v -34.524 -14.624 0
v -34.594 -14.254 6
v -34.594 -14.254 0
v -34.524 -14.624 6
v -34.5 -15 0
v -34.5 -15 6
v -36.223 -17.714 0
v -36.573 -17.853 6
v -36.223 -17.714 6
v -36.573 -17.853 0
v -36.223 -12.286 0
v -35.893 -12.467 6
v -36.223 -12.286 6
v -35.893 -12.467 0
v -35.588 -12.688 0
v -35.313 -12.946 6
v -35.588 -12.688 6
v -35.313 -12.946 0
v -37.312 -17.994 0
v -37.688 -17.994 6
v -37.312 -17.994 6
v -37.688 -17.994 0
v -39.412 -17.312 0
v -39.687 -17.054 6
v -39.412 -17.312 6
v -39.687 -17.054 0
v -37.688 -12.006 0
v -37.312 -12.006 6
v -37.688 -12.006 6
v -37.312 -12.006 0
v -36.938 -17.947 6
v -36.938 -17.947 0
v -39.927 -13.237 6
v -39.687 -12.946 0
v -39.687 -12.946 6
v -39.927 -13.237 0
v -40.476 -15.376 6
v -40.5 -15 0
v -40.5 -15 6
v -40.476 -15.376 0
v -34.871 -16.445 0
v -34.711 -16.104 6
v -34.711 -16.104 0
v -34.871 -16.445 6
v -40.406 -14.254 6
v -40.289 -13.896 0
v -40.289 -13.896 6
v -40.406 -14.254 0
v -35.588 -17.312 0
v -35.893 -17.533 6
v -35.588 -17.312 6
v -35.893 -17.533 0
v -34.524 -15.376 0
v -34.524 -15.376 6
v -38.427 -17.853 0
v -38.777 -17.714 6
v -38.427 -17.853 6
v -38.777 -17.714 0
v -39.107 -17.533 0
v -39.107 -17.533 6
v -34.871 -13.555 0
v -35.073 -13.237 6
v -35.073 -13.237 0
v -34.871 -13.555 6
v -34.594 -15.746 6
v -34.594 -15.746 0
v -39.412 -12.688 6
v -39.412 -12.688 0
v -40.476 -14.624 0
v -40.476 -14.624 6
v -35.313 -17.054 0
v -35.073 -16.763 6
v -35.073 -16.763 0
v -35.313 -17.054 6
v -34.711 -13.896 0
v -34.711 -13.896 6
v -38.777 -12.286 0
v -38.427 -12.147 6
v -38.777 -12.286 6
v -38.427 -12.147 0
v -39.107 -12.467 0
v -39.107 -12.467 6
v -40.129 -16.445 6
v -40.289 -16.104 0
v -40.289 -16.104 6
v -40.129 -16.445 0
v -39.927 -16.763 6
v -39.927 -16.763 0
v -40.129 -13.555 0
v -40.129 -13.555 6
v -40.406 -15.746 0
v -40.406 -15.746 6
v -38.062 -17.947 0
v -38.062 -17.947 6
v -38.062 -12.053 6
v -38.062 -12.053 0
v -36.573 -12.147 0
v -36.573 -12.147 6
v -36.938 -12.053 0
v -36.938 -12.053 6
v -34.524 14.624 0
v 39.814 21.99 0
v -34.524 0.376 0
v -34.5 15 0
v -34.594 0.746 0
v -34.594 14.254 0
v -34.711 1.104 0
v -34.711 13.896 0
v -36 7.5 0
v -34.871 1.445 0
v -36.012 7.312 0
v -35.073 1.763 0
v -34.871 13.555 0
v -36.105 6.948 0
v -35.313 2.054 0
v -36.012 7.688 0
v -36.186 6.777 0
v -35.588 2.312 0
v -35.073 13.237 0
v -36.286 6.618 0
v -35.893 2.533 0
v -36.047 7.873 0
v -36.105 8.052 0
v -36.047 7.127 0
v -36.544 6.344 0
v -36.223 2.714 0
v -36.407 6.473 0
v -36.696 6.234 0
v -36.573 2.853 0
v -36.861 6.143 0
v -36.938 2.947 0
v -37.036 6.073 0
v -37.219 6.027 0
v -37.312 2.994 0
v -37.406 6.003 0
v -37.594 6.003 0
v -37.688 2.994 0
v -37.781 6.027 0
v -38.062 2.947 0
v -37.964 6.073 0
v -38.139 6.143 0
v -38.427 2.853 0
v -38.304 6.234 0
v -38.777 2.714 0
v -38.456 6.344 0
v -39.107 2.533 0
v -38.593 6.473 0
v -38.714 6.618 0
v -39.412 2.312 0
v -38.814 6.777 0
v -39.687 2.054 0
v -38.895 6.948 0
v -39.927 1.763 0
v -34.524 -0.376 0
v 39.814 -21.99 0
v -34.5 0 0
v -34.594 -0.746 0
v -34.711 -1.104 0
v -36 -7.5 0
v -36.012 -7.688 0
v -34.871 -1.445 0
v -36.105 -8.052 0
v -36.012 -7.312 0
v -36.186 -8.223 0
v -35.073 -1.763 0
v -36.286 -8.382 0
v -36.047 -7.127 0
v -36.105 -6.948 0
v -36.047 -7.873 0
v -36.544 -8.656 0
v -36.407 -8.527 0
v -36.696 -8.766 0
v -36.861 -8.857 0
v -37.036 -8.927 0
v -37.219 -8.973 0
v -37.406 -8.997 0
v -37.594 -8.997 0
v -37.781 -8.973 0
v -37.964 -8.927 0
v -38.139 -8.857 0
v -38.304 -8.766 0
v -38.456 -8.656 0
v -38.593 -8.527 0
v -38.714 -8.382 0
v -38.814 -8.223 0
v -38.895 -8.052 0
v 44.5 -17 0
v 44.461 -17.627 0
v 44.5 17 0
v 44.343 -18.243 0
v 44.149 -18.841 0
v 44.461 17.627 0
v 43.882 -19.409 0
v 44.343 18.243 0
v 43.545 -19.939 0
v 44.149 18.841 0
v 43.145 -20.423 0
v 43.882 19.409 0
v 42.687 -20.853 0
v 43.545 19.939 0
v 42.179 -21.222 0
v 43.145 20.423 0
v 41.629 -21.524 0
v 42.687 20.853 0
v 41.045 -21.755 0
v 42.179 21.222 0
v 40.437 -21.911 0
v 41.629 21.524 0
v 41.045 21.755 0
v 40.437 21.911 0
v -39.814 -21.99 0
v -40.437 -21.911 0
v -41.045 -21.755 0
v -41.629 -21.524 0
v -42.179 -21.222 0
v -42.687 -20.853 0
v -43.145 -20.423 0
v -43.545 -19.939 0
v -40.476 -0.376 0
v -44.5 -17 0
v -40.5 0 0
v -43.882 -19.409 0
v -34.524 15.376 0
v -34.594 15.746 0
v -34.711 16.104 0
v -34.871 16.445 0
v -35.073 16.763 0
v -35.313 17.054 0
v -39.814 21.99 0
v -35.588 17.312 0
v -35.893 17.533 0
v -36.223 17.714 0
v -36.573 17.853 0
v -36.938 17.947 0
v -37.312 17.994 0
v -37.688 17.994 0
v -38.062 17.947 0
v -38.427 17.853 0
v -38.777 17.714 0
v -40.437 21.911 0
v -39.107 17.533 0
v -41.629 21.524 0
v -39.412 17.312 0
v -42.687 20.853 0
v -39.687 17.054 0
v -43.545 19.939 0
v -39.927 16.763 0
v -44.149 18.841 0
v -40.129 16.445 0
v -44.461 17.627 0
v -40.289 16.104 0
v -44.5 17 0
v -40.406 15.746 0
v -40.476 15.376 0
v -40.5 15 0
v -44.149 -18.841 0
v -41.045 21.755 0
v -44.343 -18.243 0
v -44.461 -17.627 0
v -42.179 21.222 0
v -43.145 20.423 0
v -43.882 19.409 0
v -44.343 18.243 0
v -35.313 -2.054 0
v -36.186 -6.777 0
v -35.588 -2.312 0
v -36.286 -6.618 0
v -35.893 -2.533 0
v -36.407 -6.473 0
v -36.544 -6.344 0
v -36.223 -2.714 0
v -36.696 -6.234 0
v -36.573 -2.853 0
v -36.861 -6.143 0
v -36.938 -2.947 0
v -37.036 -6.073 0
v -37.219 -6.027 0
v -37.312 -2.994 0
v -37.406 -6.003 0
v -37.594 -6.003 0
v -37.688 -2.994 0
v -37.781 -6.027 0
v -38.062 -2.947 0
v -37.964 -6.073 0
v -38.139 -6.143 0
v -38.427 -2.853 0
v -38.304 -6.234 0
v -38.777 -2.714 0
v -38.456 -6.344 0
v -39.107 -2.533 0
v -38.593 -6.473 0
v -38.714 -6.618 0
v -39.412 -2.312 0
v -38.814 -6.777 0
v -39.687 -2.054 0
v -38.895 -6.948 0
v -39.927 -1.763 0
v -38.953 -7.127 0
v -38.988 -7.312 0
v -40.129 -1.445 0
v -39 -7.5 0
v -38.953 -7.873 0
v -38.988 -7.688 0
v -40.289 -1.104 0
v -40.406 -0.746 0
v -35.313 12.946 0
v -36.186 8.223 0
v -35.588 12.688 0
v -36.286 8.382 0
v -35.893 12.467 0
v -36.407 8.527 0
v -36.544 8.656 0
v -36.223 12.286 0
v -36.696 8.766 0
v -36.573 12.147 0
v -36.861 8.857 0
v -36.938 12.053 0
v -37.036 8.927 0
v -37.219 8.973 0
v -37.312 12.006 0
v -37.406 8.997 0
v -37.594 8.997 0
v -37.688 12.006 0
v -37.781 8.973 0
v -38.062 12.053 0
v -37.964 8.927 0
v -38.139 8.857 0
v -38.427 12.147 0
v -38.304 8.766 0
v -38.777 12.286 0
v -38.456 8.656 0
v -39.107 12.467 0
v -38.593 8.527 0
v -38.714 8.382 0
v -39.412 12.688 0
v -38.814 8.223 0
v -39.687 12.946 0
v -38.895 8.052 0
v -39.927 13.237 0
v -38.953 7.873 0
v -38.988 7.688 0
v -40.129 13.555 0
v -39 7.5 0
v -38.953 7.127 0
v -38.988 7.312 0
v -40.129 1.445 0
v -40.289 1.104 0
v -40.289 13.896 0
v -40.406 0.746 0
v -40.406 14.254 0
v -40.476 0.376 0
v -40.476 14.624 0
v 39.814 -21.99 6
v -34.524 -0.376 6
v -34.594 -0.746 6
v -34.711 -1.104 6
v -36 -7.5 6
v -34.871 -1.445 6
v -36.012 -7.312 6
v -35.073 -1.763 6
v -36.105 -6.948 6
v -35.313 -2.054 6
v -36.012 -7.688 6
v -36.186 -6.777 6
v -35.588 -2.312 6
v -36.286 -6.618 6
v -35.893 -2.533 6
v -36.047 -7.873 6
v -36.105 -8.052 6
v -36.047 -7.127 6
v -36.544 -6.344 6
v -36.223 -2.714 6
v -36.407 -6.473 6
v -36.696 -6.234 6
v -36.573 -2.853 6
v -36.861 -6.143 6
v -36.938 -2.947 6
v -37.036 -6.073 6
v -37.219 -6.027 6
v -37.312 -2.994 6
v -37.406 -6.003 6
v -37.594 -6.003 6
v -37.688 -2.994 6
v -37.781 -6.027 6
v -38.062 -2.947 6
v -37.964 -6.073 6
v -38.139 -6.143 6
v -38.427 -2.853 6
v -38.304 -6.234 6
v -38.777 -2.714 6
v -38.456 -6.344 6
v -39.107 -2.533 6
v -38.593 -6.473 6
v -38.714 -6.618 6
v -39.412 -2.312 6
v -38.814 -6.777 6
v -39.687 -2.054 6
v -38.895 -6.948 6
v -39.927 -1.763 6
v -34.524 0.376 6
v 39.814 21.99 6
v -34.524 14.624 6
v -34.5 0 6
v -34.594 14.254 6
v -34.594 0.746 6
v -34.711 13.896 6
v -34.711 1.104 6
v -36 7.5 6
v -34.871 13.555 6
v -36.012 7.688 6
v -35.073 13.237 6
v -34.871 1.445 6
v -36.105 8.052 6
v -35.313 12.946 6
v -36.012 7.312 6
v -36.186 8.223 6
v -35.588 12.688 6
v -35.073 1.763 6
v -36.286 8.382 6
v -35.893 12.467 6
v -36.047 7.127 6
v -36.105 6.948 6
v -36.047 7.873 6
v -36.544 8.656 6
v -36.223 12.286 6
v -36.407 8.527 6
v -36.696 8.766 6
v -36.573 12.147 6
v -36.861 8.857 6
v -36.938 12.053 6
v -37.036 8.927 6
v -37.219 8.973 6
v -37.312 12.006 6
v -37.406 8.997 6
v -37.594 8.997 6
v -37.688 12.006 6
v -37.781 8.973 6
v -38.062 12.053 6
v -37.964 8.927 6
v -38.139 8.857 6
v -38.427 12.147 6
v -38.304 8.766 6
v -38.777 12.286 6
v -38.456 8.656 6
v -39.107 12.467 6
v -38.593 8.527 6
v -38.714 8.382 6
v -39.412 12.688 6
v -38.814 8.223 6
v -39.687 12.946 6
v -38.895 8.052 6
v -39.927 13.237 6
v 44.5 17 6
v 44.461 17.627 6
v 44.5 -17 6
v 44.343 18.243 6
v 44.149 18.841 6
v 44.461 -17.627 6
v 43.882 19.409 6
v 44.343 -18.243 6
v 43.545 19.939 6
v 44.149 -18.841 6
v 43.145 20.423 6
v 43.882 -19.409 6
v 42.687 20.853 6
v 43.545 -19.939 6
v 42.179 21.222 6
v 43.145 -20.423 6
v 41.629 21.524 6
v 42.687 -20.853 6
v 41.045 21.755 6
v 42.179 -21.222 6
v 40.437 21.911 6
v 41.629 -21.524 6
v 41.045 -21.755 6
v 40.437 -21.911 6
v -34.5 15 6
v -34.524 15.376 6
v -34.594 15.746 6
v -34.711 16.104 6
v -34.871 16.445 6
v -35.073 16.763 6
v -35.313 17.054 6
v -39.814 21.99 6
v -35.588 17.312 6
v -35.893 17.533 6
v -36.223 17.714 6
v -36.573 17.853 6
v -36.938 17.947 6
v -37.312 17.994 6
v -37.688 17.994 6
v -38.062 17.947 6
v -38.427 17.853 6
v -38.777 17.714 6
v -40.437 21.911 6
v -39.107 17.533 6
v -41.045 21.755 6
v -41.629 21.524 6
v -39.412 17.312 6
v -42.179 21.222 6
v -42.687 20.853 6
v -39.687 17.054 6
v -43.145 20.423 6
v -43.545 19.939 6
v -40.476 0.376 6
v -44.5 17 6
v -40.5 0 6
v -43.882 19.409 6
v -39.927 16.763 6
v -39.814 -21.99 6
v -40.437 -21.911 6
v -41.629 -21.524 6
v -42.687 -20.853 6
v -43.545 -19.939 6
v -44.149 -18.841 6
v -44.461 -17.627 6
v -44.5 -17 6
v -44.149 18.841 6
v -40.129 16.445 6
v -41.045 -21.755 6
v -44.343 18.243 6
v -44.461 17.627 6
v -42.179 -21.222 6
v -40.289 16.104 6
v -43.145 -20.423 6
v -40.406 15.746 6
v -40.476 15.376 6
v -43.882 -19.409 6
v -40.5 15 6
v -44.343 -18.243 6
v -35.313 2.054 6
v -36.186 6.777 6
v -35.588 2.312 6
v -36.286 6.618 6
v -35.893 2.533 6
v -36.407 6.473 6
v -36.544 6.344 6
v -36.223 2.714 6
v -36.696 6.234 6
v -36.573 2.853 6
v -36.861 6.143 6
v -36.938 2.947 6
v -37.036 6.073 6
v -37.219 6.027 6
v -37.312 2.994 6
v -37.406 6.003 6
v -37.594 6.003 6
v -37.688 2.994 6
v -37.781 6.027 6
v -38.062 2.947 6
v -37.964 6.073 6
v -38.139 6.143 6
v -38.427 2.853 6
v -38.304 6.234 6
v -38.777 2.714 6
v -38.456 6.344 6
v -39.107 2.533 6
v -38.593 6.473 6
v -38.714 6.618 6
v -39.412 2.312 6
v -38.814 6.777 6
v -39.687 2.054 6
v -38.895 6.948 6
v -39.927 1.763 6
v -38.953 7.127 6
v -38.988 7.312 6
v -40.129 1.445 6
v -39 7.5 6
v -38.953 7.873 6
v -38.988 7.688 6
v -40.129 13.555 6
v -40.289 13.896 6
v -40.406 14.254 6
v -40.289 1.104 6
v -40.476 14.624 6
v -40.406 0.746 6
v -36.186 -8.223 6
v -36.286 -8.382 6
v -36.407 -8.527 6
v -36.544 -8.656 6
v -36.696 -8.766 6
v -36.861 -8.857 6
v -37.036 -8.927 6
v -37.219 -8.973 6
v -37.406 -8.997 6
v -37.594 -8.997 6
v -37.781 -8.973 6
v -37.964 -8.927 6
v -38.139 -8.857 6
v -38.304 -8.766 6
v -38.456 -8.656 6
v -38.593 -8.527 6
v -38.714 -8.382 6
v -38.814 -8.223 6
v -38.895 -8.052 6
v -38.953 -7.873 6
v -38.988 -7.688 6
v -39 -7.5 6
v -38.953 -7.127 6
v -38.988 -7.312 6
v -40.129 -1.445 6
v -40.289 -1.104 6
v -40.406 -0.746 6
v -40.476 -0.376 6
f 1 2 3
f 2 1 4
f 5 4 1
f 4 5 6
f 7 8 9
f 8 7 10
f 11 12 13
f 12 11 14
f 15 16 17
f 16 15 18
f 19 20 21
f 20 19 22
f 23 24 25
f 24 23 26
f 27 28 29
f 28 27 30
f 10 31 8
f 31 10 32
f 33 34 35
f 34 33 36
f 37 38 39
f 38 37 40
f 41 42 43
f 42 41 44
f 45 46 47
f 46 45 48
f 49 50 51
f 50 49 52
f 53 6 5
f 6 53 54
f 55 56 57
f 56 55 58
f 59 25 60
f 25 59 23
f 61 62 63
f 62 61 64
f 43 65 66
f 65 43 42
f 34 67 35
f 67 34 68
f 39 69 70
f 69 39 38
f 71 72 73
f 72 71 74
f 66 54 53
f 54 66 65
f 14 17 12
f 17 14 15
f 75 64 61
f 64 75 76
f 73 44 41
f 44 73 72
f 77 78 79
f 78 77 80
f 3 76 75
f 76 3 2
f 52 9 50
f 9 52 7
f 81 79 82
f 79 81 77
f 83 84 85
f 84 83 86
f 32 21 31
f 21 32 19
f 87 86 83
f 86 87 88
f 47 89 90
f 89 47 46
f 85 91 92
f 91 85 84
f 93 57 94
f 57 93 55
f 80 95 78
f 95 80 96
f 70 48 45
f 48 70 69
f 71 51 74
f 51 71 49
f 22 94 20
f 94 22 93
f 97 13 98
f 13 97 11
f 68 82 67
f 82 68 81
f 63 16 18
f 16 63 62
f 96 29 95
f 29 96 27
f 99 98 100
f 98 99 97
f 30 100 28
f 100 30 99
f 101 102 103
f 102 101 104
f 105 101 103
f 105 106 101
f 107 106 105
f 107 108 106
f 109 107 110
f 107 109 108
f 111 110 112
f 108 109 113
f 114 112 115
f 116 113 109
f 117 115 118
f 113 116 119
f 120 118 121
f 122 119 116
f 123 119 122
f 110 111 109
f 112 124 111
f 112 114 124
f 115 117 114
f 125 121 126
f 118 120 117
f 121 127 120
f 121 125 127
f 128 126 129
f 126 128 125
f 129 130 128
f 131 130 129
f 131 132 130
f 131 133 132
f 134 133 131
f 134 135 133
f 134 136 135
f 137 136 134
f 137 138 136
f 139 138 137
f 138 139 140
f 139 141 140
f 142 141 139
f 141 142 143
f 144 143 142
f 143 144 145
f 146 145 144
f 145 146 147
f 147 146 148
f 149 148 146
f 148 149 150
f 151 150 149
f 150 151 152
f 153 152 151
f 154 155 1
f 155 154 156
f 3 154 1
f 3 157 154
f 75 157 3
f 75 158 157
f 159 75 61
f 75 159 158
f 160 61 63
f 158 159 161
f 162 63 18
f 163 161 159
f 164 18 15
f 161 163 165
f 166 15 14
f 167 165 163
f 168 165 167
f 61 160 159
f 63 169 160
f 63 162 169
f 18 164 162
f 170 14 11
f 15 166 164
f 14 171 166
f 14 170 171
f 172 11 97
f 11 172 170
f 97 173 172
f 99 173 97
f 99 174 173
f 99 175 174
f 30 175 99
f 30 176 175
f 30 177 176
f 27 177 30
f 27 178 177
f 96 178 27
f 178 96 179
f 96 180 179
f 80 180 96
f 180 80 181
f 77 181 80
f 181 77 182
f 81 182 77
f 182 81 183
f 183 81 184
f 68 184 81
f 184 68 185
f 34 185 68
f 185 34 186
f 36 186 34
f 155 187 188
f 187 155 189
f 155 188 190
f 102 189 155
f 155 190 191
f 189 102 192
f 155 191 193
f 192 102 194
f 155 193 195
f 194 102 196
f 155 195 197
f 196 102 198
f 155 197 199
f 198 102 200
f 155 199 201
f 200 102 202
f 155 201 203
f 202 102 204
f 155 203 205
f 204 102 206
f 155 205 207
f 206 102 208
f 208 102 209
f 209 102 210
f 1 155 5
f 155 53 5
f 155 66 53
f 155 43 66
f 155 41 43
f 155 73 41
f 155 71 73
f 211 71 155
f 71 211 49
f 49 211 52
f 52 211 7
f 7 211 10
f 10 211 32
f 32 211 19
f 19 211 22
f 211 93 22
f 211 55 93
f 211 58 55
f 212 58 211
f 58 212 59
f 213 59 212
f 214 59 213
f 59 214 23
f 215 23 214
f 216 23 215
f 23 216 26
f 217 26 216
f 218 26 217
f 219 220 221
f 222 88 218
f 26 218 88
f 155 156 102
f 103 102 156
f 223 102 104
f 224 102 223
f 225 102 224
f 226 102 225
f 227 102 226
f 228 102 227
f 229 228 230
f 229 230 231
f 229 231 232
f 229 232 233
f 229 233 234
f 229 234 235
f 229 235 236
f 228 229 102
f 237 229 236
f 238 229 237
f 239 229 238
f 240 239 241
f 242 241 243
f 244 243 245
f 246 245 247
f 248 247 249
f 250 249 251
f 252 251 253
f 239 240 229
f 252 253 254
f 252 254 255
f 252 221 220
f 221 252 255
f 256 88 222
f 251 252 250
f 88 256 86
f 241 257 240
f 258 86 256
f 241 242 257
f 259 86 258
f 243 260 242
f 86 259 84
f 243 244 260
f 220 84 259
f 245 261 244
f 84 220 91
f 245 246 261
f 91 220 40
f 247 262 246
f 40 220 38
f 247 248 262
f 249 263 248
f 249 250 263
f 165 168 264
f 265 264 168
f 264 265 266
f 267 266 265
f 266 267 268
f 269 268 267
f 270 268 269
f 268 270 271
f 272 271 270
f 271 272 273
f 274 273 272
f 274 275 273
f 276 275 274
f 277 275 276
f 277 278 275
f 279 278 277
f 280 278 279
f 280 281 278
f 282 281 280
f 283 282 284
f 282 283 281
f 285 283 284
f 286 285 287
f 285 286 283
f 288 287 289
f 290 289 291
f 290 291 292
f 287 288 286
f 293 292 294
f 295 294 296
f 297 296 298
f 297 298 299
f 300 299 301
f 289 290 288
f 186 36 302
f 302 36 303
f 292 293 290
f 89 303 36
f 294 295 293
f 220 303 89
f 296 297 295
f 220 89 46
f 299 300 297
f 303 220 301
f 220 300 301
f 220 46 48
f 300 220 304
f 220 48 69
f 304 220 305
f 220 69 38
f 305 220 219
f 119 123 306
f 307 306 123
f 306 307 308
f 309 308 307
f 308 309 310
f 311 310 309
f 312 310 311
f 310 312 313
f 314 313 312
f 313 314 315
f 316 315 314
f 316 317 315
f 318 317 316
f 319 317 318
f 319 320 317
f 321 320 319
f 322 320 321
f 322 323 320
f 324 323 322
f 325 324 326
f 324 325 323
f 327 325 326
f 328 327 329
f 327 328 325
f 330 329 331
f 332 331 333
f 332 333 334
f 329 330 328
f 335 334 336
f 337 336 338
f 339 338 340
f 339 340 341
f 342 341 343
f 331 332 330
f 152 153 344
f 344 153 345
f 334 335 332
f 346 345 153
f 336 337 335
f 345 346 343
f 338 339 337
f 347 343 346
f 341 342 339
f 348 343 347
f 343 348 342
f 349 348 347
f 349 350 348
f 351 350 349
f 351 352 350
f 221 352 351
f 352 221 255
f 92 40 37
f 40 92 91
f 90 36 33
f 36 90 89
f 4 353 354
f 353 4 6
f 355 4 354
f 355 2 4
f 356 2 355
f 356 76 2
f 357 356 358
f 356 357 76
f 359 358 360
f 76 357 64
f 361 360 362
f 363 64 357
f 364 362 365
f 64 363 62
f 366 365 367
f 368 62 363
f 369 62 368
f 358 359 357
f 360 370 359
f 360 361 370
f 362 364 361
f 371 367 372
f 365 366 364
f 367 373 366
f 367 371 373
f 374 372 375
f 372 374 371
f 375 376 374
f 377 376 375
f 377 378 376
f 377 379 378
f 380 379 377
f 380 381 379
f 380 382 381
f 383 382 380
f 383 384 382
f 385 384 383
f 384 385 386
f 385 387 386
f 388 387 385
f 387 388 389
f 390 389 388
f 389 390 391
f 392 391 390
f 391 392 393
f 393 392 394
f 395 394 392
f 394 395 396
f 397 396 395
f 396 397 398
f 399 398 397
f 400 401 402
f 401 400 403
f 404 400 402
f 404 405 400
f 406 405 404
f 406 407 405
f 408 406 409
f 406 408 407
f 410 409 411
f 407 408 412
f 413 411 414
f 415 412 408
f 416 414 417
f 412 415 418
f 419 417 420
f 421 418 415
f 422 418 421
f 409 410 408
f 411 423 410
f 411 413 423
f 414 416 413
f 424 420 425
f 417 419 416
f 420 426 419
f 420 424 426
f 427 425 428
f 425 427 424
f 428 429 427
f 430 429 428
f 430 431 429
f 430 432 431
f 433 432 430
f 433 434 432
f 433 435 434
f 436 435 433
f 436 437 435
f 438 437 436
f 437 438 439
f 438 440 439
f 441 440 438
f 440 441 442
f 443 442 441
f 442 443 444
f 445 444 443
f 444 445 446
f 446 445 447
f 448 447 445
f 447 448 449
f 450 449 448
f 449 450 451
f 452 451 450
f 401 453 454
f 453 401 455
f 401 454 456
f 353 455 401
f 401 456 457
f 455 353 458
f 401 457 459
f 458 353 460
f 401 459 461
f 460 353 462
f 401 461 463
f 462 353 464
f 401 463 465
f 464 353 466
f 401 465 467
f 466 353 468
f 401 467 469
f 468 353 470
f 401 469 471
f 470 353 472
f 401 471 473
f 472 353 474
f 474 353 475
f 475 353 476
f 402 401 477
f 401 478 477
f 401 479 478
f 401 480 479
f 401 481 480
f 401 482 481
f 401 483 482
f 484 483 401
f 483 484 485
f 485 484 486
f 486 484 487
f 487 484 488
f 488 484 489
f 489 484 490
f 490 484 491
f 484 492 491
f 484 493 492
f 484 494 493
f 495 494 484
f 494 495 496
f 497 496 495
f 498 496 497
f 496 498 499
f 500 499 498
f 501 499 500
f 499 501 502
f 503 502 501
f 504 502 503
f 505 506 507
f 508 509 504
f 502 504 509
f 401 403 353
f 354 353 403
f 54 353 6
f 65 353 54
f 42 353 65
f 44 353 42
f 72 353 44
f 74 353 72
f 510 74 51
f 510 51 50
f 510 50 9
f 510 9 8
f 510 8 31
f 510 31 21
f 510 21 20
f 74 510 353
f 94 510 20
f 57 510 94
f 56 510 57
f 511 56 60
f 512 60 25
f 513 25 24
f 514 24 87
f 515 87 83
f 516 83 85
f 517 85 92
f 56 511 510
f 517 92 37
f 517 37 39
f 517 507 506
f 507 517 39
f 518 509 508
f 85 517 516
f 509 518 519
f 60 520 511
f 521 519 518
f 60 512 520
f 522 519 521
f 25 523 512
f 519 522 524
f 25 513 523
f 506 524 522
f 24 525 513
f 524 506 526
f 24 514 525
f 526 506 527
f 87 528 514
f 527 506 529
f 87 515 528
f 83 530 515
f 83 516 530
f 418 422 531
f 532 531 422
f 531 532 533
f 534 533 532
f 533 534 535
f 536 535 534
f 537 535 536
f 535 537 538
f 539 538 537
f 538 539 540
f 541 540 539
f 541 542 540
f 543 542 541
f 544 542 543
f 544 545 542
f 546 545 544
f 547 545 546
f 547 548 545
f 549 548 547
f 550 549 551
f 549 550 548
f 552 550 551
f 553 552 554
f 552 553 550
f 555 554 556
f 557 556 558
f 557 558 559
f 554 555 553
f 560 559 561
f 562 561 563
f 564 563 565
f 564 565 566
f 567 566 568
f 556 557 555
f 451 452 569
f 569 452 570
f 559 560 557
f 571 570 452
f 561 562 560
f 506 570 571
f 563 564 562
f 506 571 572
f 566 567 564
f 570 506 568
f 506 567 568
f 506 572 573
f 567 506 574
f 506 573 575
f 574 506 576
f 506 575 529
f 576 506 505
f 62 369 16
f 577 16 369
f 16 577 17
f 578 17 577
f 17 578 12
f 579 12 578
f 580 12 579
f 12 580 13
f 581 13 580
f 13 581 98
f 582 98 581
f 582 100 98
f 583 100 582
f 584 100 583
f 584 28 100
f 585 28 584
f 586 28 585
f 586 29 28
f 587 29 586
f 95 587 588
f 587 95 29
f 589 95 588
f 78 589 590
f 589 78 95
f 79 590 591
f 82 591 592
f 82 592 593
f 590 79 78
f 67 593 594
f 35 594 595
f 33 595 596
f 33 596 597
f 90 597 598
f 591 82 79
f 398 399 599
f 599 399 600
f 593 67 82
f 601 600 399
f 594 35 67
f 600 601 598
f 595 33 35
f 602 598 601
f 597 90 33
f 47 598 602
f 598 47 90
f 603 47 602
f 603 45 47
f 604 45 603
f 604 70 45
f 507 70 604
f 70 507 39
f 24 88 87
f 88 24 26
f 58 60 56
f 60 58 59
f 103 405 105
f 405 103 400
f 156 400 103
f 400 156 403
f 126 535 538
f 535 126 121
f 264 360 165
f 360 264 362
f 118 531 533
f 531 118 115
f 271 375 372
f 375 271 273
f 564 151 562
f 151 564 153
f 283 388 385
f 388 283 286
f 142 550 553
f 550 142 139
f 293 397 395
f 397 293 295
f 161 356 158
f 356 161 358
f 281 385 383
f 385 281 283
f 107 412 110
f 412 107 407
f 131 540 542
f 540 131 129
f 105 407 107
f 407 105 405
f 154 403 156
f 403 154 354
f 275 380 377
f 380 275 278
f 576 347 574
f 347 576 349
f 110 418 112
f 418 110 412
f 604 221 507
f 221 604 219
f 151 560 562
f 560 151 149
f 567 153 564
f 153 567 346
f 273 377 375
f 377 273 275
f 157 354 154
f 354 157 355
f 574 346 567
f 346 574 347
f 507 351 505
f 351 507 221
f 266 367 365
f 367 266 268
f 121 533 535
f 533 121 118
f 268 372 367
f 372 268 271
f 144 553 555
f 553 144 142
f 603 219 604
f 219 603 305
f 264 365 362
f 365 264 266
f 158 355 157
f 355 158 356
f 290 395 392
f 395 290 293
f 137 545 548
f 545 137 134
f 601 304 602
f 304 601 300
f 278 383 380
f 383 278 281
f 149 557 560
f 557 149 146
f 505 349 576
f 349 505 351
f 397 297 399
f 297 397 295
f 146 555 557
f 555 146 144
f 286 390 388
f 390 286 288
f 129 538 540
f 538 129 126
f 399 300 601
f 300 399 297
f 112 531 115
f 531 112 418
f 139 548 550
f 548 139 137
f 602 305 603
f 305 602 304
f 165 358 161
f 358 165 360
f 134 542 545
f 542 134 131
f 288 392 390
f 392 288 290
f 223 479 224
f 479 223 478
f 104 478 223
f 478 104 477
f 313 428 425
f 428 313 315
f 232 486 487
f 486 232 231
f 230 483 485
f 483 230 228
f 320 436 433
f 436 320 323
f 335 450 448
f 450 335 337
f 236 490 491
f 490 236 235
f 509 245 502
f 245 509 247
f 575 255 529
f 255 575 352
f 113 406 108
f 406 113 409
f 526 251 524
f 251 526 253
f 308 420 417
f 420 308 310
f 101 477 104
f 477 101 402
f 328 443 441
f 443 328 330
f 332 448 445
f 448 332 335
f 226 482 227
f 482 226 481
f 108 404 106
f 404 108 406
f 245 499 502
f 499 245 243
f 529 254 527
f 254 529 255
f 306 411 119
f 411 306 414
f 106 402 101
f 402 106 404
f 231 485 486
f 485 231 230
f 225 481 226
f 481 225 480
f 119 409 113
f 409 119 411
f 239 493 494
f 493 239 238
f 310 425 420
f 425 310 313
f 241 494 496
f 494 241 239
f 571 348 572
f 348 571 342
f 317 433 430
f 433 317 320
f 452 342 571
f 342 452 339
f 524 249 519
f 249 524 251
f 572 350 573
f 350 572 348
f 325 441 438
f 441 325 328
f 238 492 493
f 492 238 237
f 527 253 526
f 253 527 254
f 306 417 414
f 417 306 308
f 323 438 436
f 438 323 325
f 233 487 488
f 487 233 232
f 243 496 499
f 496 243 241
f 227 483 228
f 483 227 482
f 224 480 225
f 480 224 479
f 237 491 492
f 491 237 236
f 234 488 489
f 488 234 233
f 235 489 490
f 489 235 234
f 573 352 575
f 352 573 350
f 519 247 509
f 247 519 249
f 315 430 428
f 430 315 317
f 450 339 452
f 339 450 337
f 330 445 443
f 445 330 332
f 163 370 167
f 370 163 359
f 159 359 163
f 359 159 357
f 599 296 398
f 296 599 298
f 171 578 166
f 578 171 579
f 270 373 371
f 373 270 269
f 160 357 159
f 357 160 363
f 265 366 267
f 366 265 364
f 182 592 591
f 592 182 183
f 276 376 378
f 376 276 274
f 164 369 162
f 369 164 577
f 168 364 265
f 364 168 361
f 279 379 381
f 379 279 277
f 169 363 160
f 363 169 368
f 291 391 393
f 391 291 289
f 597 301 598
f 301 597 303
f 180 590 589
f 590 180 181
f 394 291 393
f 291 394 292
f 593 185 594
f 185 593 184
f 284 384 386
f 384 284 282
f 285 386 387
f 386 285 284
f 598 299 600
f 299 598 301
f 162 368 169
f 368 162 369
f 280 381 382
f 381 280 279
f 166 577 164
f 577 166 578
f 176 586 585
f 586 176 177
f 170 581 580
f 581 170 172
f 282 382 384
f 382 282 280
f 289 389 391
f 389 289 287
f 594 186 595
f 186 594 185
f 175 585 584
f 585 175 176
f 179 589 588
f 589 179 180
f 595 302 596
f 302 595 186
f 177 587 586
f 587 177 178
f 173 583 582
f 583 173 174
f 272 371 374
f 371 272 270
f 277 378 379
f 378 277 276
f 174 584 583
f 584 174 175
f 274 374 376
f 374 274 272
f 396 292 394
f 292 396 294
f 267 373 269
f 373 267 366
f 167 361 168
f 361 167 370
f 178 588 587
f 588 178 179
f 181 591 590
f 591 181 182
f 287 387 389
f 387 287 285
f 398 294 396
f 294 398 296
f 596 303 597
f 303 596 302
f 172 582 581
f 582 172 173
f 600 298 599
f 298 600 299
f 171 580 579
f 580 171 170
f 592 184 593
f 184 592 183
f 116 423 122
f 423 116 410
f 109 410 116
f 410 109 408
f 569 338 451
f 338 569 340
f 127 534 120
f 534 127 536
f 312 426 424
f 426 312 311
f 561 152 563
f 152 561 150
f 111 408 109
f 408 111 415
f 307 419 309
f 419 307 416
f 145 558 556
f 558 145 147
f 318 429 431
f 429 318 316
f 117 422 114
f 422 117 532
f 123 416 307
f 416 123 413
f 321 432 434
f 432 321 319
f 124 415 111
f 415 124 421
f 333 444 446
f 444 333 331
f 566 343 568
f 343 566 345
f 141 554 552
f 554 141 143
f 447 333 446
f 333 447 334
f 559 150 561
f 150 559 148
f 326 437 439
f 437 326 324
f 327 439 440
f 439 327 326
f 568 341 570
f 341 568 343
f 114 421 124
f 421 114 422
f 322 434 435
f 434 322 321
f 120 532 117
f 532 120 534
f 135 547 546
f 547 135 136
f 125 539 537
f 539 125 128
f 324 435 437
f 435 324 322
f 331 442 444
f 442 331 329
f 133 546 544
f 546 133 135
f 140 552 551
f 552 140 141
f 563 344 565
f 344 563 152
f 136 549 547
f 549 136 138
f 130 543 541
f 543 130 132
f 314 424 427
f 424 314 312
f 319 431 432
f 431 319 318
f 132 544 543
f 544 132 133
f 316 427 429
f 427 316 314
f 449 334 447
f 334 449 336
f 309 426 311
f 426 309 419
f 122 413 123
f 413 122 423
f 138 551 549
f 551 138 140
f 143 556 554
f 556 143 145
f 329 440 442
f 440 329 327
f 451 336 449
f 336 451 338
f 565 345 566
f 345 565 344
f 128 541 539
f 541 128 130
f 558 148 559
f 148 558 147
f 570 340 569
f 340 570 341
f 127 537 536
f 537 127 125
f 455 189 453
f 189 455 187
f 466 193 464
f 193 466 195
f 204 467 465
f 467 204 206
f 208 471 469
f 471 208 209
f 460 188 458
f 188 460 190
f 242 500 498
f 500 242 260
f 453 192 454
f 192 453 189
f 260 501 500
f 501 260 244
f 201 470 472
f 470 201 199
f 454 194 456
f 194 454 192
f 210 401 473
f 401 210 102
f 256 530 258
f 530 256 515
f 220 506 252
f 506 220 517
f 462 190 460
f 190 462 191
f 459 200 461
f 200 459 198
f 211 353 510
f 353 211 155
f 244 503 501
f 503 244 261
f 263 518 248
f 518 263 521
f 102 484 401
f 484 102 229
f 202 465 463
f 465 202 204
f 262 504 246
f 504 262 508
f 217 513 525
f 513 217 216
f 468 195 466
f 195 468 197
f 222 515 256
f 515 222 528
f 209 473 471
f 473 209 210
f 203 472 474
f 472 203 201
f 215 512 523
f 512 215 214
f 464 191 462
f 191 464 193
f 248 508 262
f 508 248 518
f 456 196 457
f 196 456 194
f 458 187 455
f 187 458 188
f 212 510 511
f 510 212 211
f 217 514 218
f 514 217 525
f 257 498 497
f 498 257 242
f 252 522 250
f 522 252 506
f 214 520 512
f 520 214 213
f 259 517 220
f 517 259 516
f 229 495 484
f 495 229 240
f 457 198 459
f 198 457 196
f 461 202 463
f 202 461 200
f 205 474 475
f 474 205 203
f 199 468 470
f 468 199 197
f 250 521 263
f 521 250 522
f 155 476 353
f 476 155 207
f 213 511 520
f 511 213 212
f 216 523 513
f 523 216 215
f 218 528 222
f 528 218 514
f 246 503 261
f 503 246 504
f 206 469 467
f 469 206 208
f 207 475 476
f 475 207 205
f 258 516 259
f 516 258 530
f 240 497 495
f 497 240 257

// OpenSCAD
$fn = 50;


difference() {
	union() {
		hull() {
			translate(v = [-39.5000000000, 17.0000000000, 0]) {
				cylinder(h = 6, r = 5);
			}
			translate(v = [39.5000000000, 17.0000000000, 0]) {
				cylinder(h = 6, r = 5);
			}
			translate(v = [-39.5000000000, -17.0000000000, 0]) {
				cylinder(h = 6, r = 5);
			}
			translate(v = [39.5000000000, -17.0000000000, 0]) {
				cylinder(h = 6, r = 5);
			}
		}
	}
	union() {
		translate(v = [-37.5000000000, -15.0000000000, 0]) {
			cylinder(h = 6, r = 3.0000000000);
		}
		translate(v = [-37.5000000000, 0.0000000000, 0]) {
			cylinder(h = 6, r = 3.0000000000);
		}
		translate(v = [-37.5000000000, 15.0000000000, 0]) {
			cylinder(h = 6, r = 3.0000000000);
		}
		translate(v = [-37.5000000000, -15.0000000000, 0]) {
			cylinder(h = 6, r = 1.5000000000);
		}
		translate(v = [-37.5000000000, -7.5000000000, 0]) {
			cylinder(h = 6, r = 1.5000000000);
		}
		translate(v = [-37.5000000000, 0.0000000000, 0]) {
			cylinder(h = 6, r = 1.5000000000);
		}
		translate(v = [-37.5000000000, 7.5000000000, 0]) {
			cylinder(h = 6, r = 1.5000000000);
		}
		translate(v = [-37.5000000000, 15.0000000000, 0]) {
			cylinder(h = 6, r = 1.5000000000);
		}
		translate(v = [-37.5000000000, -15.0000000000, 0]) {
			cylinder(h = 6, r = 1.5000000000);
		}
		translate(v = [-37.5000000000, -7.5000000000, 0]) {
			cylinder(h = 6, r = 1.5000000000);
		}
		translate(v = [-37.5000000000, 0.0000000000, 0]) {
			cylinder(h = 6, r = 1.5000000000);
		}
		translate(v = [-37.5000000000, 7.5000000000, 0]) {
			cylinder(h = 6, r = 1.5000000000);
		}
		translate(v = [-37.5000000000, 15.0000000000, 0]) {
			cylinder(h = 6, r = 1.5000000000);
		}
		translate(v = [-37.5000000000, -15.0000000000, 0]) {
			cylinder(h = 6, r = 1.5000000000);
		}
		translate(v = [-37.5000000000, -7.5000000000, 0]) {
			cylinder(h = 6, r = 1.5000000000);
		}
		translate(v = [-37.5000000000, 0.0000000000, 0]) {
			cylinder(h = 6, r = 1.5000000000);
		}
		translate(v = [-37.5000000000, 7.5000000000, 0]) {
			cylinder(h = 6, r = 1.5000000000);
		}
		translate(v = [-37.5000000000, 15.0000000000, 0]) {
			cylinder(h = 6, r = 1.5000000000);
		}
	}
}
